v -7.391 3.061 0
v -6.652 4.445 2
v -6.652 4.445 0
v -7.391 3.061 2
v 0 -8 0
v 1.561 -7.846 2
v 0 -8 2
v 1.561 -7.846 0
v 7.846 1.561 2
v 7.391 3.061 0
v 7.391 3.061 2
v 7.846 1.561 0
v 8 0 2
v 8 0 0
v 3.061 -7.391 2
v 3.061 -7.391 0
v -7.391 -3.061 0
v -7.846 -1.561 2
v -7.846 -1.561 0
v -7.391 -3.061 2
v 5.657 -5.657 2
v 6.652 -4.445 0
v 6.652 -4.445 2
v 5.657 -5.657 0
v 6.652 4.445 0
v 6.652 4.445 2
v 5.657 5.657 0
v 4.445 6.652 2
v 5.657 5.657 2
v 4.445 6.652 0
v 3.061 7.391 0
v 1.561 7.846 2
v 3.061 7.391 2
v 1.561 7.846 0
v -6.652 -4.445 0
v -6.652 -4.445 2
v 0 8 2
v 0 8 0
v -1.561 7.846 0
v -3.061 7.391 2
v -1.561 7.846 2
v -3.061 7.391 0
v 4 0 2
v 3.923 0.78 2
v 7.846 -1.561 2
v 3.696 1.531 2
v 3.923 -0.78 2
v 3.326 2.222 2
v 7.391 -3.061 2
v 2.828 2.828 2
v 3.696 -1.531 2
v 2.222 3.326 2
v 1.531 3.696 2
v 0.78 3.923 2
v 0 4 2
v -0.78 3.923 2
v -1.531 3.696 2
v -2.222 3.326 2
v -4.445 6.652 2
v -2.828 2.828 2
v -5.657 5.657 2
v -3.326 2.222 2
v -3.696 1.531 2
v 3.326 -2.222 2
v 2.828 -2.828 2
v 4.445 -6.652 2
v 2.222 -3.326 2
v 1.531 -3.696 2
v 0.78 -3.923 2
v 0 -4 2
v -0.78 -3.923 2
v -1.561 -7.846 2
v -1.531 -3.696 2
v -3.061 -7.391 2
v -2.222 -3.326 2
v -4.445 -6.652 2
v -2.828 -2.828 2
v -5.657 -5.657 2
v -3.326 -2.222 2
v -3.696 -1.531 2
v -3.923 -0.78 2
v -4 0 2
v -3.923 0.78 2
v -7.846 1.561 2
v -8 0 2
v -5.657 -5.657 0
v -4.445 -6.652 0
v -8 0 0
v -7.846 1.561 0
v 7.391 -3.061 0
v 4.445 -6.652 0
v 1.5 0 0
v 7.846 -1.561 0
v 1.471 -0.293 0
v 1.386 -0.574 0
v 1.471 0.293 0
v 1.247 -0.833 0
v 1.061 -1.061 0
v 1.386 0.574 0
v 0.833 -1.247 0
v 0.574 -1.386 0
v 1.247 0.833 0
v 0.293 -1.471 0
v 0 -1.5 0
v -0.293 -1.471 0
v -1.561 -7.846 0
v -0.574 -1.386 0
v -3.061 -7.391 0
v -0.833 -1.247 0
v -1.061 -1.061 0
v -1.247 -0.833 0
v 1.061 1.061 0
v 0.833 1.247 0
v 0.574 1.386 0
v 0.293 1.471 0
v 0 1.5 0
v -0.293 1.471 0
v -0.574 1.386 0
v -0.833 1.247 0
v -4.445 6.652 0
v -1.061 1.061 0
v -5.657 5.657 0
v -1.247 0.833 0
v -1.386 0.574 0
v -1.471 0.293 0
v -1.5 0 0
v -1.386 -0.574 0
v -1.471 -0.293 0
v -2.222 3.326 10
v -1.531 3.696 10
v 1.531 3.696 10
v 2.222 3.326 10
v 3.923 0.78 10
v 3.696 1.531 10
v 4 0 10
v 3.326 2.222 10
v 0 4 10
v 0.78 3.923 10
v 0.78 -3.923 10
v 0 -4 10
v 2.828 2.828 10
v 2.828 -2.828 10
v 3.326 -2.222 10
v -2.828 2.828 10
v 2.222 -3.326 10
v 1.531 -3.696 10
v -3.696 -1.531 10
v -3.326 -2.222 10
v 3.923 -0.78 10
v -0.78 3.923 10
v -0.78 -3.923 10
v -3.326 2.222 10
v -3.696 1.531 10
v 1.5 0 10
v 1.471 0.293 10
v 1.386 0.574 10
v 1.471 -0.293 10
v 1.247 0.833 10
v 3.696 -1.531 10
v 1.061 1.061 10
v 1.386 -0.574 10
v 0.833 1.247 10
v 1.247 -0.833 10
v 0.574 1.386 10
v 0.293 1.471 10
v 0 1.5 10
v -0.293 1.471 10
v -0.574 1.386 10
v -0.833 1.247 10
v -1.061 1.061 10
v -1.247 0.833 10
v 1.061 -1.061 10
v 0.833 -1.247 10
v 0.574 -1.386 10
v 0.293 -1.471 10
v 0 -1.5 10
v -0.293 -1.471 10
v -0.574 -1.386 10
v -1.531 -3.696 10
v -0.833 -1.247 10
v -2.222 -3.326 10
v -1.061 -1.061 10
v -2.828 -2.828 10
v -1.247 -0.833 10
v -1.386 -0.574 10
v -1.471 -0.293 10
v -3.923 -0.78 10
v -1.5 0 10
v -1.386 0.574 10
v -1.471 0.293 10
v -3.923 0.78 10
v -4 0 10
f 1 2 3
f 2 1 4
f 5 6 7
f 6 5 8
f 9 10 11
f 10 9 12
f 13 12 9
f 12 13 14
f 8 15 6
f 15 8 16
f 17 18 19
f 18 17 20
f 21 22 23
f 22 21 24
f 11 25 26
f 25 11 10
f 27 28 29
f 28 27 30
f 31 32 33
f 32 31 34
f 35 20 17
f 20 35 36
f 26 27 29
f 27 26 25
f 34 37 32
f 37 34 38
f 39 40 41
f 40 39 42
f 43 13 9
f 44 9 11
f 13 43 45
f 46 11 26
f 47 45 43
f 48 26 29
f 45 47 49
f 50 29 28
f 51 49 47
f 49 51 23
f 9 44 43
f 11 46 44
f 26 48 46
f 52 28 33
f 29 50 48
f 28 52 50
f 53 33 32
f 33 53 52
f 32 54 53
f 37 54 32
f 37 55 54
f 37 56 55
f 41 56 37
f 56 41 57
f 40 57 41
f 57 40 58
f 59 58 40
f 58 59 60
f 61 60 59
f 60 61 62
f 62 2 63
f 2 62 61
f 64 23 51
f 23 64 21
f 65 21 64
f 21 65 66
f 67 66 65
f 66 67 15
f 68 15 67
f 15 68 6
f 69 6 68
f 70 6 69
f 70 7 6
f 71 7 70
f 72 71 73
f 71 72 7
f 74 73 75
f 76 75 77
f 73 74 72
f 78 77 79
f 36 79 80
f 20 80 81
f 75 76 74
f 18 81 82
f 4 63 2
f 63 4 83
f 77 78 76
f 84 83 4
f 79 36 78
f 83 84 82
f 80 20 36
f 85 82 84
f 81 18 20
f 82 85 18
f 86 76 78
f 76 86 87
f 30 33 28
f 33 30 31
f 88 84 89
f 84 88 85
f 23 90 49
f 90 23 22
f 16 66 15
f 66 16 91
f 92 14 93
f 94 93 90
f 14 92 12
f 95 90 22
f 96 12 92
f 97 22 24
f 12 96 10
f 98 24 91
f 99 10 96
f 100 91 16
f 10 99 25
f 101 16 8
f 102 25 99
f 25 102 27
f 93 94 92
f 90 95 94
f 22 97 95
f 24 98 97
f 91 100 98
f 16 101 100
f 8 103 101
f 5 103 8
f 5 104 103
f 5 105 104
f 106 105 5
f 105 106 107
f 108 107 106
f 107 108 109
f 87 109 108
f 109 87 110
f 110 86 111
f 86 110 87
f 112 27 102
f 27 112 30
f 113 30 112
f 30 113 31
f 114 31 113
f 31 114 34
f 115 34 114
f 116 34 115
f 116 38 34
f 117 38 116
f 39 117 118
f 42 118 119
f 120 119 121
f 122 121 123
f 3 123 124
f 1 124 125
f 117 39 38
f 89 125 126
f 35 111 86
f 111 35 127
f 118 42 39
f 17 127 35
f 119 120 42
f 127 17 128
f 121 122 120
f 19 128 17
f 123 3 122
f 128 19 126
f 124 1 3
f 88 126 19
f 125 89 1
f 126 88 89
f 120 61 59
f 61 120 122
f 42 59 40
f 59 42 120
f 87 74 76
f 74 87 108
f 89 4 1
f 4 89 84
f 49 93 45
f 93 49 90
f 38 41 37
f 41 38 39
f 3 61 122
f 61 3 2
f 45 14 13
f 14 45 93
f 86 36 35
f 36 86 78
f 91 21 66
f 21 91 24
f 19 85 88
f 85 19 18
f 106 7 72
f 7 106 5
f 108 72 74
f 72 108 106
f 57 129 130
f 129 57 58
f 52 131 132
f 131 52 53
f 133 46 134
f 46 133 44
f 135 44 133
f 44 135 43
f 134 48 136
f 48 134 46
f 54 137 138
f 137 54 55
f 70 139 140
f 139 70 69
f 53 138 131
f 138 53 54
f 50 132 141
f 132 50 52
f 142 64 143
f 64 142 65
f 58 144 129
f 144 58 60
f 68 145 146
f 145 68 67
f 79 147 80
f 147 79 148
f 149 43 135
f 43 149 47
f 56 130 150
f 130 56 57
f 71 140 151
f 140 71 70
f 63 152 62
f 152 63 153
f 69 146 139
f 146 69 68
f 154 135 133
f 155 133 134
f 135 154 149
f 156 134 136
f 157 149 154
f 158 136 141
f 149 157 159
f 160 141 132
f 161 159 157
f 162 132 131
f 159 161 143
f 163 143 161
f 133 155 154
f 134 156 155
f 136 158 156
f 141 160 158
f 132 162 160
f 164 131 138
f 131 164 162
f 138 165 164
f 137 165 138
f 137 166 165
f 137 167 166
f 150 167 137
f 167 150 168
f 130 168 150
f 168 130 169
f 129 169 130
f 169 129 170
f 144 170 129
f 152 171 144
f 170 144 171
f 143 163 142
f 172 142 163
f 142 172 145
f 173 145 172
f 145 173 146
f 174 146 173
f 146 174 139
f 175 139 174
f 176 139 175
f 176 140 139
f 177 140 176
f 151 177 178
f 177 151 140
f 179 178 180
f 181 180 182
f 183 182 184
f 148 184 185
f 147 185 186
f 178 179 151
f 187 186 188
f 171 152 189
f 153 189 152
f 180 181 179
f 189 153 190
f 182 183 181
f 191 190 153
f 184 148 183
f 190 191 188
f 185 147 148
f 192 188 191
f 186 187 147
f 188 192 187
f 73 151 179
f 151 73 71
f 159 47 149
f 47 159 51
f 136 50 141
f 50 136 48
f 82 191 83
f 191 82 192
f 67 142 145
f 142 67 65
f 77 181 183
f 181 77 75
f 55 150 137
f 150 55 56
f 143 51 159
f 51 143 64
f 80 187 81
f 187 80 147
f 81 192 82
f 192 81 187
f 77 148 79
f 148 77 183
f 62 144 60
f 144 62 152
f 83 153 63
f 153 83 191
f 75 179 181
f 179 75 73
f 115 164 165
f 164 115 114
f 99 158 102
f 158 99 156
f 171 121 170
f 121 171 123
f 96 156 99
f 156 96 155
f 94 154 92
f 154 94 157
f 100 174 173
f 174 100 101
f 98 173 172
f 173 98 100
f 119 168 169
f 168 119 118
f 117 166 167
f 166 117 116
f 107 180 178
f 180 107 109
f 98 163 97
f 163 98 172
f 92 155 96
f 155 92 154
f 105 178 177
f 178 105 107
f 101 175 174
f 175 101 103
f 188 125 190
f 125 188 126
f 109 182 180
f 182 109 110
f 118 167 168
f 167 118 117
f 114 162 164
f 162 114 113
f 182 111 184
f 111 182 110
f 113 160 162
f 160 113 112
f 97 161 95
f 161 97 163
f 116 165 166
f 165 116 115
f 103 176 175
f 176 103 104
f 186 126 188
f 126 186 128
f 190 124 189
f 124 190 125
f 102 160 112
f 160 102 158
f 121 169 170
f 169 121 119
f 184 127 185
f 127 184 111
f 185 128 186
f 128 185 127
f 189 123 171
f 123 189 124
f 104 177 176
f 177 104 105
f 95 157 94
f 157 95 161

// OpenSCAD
$fn = 32;

// ----------------------------------------------------------------------
// Micro post: flanged post, 5-20 mm class
// ----------------------------------------------------------------------

// --- parameters (mm) ---
post_d = 8;               // post diameter
post_h = 8;               // post height above the flange
flange_d = 16;            // flange diameter
flange_t = 2;             // flange thickness
bore_d = 3;               // through bore

total_h = post_h + flange_t;  // overall height

difference() {
  union() {
    cylinder(h = flange_t, d = flange_d);
    translate([0, 0, flange_t]) cylinder(h = post_h, d = post_d);
  }
  translate([0, 0, -1]) cylinder(h = total_h + 2, d = bore_d);
}
